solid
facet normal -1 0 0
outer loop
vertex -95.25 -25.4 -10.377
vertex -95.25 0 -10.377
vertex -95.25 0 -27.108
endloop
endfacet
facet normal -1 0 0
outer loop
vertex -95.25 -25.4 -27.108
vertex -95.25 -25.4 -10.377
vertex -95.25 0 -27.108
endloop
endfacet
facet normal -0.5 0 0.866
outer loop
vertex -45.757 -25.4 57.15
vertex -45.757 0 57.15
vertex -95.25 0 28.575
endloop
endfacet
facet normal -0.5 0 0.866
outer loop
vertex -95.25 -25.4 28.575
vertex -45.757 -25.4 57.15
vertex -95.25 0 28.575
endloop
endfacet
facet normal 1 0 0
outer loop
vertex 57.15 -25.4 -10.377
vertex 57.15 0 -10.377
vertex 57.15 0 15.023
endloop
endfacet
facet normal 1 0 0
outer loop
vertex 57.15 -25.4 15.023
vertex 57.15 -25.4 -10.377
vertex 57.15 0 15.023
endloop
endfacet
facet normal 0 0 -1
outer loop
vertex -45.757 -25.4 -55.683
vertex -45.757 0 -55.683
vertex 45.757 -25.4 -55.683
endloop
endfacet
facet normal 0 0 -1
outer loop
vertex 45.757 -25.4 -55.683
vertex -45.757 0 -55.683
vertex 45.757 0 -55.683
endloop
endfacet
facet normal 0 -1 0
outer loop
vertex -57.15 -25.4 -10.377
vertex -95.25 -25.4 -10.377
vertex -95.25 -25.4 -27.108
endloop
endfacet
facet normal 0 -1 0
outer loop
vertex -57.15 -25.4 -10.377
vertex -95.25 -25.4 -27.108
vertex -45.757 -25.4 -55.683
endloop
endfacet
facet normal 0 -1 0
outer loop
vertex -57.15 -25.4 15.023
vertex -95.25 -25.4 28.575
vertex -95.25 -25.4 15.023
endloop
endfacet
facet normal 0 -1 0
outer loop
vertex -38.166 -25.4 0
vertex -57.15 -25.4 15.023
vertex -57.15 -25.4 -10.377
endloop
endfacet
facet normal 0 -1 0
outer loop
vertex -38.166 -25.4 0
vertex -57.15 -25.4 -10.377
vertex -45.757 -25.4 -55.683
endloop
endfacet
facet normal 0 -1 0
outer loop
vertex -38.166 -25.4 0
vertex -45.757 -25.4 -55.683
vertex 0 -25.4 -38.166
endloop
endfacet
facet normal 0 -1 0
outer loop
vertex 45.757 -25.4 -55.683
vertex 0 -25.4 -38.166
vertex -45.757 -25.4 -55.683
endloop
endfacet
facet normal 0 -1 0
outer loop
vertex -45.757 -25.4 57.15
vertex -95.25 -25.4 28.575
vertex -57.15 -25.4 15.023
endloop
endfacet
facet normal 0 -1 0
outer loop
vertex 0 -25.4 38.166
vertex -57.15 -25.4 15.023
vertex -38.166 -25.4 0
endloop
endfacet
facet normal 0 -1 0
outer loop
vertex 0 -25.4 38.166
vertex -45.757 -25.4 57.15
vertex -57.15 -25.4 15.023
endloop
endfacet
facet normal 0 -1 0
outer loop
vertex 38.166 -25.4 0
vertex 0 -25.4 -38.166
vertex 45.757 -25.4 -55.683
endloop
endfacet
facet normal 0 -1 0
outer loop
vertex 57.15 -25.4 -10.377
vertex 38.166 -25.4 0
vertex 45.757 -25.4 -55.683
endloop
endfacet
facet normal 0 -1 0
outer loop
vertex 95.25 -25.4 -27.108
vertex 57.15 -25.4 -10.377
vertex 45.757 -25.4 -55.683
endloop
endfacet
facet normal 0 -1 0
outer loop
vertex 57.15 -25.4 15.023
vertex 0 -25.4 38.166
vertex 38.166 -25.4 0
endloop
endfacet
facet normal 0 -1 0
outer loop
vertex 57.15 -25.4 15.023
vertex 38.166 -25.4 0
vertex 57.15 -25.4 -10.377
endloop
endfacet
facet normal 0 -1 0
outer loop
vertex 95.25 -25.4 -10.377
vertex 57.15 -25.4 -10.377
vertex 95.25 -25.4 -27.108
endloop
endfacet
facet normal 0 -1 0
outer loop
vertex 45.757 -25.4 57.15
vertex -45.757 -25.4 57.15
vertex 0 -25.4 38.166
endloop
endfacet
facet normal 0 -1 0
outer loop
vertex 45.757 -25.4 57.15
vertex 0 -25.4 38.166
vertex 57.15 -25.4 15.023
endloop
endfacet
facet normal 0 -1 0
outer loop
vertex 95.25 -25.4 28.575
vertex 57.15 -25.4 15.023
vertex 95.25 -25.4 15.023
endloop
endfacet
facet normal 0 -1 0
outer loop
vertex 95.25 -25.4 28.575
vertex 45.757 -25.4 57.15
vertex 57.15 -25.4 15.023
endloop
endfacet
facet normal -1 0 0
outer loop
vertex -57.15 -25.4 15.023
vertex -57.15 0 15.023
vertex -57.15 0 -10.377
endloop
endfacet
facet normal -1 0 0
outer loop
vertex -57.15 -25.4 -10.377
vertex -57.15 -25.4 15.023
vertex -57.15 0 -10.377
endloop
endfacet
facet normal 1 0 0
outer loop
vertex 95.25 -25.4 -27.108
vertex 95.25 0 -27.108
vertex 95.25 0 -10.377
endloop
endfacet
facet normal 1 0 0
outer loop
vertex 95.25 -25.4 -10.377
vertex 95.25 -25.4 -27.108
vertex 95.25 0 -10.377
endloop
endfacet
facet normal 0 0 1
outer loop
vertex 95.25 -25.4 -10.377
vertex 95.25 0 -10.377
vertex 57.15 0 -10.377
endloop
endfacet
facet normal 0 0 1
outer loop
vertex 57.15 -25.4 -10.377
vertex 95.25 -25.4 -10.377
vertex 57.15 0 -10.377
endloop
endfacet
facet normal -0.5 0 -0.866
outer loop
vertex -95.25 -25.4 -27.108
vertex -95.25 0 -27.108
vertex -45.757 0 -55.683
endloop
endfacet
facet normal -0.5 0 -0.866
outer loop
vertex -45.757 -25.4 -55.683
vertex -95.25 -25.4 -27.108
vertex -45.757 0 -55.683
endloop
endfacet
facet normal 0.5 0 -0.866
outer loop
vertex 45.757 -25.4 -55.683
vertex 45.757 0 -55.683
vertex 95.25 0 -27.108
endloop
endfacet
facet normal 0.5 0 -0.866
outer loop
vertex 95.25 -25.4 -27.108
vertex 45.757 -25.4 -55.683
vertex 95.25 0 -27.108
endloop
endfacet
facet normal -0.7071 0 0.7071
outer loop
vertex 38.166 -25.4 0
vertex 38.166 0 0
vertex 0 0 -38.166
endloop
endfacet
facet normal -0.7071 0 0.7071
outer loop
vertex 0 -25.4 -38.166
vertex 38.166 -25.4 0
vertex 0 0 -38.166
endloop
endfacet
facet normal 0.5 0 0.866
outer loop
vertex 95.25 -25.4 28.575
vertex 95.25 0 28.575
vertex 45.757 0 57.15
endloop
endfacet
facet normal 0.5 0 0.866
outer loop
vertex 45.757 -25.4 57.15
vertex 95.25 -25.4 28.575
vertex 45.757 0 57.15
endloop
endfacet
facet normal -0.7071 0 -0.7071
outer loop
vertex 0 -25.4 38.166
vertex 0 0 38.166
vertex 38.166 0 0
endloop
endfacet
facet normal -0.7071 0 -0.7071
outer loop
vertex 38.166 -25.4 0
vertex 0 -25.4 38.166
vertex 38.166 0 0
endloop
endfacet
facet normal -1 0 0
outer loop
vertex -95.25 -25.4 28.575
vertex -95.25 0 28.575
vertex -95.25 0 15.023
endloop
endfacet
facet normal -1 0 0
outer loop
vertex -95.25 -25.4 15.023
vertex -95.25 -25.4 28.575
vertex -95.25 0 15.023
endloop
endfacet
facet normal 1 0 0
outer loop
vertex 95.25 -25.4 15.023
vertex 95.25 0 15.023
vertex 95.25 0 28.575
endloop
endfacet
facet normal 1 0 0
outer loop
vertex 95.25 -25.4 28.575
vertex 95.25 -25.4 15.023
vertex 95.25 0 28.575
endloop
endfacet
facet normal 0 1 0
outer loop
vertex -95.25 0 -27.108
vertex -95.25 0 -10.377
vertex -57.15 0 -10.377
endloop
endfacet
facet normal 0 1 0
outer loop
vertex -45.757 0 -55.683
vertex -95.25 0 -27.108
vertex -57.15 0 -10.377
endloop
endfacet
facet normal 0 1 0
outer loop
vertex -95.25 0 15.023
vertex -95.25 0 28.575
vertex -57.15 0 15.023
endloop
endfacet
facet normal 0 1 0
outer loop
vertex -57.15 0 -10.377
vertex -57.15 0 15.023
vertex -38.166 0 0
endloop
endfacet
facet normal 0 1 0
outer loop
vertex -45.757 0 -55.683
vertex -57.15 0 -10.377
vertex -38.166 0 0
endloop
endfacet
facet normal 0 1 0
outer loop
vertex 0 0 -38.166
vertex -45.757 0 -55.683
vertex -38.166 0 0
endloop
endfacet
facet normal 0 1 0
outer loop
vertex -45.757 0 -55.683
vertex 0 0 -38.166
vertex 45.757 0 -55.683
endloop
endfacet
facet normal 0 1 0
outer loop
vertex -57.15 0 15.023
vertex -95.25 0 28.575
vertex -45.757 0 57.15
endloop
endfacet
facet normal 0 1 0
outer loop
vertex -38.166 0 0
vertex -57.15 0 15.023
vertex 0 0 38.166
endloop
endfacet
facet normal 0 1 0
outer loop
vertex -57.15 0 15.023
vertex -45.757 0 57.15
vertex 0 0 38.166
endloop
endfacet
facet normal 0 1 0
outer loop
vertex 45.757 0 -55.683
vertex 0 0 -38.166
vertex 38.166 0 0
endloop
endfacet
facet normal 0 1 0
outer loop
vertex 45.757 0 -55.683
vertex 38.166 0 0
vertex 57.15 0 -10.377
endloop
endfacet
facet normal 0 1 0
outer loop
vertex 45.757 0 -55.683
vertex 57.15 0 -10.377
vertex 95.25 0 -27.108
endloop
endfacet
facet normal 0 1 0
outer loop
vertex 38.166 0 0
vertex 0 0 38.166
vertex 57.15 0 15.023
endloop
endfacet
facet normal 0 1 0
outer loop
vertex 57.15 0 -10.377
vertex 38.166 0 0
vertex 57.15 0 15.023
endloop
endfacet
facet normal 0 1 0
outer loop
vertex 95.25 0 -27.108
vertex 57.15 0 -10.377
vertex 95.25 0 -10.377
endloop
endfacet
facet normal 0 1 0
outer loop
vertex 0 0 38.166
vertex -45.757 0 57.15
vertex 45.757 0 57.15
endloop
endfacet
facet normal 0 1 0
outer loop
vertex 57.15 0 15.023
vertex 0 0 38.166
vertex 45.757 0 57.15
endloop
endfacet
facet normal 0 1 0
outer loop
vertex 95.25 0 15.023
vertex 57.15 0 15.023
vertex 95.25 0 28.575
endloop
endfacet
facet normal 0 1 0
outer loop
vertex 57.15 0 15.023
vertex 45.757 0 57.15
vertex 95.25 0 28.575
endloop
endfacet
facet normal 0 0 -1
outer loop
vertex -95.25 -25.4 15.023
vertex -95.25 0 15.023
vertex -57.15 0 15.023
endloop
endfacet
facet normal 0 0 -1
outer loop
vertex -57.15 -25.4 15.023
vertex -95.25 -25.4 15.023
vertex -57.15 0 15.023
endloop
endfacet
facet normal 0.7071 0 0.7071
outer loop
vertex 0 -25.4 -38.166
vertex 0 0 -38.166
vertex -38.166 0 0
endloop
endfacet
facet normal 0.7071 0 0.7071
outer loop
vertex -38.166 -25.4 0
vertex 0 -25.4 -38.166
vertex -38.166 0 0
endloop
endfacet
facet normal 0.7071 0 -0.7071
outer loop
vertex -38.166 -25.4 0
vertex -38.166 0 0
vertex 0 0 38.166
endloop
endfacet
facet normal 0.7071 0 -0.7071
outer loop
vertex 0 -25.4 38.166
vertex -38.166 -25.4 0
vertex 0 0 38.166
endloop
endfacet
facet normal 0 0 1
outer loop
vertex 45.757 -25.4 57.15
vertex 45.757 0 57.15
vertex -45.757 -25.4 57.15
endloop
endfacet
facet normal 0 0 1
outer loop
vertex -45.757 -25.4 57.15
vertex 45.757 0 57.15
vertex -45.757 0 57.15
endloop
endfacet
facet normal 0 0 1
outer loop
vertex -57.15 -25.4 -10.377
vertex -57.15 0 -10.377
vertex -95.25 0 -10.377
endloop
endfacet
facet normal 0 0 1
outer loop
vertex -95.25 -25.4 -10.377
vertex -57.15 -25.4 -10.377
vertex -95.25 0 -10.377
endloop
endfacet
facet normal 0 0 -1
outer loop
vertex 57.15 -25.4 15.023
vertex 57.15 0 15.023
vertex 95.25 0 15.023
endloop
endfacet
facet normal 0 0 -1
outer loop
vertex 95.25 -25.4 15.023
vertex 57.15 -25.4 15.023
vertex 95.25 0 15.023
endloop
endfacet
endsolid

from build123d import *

# Parameters (mm, degrees)
F1_DEPTH = 25.4


with BuildPart() as f1:
    # F0 (on Front) → F1 (new body)
    with BuildSketch(Plane.XZ):
        Polygon((-37.432403, 0.733686), (0, 38.166089), (37.432403, 0.733686), (57.15, 0.733686), (57.15, 15.022763), (95.25, 15.022763), (95.25, 28.575), (45.756648, 57.15), (0, 57.15), (-45.756648, 57.15), (-95.25, 28.575), (-95.25, 15.022763), (-57.15, 15.022763), (-57.15, 0.733686), align=None)
        Polygon((57.15, 0.733686), (37.432403, 0.733686), (38.166089, 0), (0, -38.166089), (-38.166089, 0), (-37.432403, 0.733686), (-57.15, 0.733686), (-57.15, -10.377237), (-95.25, -10.377237), (-95.25, -27.107628), (-45.756648, -55.682628), (45.756648, -55.682628), (95.25, -27.107628), (95.25, -10.377237), (57.15, -10.377237), align=None)
    extrude(amount=F1_DEPTH)


solid = f1.part
